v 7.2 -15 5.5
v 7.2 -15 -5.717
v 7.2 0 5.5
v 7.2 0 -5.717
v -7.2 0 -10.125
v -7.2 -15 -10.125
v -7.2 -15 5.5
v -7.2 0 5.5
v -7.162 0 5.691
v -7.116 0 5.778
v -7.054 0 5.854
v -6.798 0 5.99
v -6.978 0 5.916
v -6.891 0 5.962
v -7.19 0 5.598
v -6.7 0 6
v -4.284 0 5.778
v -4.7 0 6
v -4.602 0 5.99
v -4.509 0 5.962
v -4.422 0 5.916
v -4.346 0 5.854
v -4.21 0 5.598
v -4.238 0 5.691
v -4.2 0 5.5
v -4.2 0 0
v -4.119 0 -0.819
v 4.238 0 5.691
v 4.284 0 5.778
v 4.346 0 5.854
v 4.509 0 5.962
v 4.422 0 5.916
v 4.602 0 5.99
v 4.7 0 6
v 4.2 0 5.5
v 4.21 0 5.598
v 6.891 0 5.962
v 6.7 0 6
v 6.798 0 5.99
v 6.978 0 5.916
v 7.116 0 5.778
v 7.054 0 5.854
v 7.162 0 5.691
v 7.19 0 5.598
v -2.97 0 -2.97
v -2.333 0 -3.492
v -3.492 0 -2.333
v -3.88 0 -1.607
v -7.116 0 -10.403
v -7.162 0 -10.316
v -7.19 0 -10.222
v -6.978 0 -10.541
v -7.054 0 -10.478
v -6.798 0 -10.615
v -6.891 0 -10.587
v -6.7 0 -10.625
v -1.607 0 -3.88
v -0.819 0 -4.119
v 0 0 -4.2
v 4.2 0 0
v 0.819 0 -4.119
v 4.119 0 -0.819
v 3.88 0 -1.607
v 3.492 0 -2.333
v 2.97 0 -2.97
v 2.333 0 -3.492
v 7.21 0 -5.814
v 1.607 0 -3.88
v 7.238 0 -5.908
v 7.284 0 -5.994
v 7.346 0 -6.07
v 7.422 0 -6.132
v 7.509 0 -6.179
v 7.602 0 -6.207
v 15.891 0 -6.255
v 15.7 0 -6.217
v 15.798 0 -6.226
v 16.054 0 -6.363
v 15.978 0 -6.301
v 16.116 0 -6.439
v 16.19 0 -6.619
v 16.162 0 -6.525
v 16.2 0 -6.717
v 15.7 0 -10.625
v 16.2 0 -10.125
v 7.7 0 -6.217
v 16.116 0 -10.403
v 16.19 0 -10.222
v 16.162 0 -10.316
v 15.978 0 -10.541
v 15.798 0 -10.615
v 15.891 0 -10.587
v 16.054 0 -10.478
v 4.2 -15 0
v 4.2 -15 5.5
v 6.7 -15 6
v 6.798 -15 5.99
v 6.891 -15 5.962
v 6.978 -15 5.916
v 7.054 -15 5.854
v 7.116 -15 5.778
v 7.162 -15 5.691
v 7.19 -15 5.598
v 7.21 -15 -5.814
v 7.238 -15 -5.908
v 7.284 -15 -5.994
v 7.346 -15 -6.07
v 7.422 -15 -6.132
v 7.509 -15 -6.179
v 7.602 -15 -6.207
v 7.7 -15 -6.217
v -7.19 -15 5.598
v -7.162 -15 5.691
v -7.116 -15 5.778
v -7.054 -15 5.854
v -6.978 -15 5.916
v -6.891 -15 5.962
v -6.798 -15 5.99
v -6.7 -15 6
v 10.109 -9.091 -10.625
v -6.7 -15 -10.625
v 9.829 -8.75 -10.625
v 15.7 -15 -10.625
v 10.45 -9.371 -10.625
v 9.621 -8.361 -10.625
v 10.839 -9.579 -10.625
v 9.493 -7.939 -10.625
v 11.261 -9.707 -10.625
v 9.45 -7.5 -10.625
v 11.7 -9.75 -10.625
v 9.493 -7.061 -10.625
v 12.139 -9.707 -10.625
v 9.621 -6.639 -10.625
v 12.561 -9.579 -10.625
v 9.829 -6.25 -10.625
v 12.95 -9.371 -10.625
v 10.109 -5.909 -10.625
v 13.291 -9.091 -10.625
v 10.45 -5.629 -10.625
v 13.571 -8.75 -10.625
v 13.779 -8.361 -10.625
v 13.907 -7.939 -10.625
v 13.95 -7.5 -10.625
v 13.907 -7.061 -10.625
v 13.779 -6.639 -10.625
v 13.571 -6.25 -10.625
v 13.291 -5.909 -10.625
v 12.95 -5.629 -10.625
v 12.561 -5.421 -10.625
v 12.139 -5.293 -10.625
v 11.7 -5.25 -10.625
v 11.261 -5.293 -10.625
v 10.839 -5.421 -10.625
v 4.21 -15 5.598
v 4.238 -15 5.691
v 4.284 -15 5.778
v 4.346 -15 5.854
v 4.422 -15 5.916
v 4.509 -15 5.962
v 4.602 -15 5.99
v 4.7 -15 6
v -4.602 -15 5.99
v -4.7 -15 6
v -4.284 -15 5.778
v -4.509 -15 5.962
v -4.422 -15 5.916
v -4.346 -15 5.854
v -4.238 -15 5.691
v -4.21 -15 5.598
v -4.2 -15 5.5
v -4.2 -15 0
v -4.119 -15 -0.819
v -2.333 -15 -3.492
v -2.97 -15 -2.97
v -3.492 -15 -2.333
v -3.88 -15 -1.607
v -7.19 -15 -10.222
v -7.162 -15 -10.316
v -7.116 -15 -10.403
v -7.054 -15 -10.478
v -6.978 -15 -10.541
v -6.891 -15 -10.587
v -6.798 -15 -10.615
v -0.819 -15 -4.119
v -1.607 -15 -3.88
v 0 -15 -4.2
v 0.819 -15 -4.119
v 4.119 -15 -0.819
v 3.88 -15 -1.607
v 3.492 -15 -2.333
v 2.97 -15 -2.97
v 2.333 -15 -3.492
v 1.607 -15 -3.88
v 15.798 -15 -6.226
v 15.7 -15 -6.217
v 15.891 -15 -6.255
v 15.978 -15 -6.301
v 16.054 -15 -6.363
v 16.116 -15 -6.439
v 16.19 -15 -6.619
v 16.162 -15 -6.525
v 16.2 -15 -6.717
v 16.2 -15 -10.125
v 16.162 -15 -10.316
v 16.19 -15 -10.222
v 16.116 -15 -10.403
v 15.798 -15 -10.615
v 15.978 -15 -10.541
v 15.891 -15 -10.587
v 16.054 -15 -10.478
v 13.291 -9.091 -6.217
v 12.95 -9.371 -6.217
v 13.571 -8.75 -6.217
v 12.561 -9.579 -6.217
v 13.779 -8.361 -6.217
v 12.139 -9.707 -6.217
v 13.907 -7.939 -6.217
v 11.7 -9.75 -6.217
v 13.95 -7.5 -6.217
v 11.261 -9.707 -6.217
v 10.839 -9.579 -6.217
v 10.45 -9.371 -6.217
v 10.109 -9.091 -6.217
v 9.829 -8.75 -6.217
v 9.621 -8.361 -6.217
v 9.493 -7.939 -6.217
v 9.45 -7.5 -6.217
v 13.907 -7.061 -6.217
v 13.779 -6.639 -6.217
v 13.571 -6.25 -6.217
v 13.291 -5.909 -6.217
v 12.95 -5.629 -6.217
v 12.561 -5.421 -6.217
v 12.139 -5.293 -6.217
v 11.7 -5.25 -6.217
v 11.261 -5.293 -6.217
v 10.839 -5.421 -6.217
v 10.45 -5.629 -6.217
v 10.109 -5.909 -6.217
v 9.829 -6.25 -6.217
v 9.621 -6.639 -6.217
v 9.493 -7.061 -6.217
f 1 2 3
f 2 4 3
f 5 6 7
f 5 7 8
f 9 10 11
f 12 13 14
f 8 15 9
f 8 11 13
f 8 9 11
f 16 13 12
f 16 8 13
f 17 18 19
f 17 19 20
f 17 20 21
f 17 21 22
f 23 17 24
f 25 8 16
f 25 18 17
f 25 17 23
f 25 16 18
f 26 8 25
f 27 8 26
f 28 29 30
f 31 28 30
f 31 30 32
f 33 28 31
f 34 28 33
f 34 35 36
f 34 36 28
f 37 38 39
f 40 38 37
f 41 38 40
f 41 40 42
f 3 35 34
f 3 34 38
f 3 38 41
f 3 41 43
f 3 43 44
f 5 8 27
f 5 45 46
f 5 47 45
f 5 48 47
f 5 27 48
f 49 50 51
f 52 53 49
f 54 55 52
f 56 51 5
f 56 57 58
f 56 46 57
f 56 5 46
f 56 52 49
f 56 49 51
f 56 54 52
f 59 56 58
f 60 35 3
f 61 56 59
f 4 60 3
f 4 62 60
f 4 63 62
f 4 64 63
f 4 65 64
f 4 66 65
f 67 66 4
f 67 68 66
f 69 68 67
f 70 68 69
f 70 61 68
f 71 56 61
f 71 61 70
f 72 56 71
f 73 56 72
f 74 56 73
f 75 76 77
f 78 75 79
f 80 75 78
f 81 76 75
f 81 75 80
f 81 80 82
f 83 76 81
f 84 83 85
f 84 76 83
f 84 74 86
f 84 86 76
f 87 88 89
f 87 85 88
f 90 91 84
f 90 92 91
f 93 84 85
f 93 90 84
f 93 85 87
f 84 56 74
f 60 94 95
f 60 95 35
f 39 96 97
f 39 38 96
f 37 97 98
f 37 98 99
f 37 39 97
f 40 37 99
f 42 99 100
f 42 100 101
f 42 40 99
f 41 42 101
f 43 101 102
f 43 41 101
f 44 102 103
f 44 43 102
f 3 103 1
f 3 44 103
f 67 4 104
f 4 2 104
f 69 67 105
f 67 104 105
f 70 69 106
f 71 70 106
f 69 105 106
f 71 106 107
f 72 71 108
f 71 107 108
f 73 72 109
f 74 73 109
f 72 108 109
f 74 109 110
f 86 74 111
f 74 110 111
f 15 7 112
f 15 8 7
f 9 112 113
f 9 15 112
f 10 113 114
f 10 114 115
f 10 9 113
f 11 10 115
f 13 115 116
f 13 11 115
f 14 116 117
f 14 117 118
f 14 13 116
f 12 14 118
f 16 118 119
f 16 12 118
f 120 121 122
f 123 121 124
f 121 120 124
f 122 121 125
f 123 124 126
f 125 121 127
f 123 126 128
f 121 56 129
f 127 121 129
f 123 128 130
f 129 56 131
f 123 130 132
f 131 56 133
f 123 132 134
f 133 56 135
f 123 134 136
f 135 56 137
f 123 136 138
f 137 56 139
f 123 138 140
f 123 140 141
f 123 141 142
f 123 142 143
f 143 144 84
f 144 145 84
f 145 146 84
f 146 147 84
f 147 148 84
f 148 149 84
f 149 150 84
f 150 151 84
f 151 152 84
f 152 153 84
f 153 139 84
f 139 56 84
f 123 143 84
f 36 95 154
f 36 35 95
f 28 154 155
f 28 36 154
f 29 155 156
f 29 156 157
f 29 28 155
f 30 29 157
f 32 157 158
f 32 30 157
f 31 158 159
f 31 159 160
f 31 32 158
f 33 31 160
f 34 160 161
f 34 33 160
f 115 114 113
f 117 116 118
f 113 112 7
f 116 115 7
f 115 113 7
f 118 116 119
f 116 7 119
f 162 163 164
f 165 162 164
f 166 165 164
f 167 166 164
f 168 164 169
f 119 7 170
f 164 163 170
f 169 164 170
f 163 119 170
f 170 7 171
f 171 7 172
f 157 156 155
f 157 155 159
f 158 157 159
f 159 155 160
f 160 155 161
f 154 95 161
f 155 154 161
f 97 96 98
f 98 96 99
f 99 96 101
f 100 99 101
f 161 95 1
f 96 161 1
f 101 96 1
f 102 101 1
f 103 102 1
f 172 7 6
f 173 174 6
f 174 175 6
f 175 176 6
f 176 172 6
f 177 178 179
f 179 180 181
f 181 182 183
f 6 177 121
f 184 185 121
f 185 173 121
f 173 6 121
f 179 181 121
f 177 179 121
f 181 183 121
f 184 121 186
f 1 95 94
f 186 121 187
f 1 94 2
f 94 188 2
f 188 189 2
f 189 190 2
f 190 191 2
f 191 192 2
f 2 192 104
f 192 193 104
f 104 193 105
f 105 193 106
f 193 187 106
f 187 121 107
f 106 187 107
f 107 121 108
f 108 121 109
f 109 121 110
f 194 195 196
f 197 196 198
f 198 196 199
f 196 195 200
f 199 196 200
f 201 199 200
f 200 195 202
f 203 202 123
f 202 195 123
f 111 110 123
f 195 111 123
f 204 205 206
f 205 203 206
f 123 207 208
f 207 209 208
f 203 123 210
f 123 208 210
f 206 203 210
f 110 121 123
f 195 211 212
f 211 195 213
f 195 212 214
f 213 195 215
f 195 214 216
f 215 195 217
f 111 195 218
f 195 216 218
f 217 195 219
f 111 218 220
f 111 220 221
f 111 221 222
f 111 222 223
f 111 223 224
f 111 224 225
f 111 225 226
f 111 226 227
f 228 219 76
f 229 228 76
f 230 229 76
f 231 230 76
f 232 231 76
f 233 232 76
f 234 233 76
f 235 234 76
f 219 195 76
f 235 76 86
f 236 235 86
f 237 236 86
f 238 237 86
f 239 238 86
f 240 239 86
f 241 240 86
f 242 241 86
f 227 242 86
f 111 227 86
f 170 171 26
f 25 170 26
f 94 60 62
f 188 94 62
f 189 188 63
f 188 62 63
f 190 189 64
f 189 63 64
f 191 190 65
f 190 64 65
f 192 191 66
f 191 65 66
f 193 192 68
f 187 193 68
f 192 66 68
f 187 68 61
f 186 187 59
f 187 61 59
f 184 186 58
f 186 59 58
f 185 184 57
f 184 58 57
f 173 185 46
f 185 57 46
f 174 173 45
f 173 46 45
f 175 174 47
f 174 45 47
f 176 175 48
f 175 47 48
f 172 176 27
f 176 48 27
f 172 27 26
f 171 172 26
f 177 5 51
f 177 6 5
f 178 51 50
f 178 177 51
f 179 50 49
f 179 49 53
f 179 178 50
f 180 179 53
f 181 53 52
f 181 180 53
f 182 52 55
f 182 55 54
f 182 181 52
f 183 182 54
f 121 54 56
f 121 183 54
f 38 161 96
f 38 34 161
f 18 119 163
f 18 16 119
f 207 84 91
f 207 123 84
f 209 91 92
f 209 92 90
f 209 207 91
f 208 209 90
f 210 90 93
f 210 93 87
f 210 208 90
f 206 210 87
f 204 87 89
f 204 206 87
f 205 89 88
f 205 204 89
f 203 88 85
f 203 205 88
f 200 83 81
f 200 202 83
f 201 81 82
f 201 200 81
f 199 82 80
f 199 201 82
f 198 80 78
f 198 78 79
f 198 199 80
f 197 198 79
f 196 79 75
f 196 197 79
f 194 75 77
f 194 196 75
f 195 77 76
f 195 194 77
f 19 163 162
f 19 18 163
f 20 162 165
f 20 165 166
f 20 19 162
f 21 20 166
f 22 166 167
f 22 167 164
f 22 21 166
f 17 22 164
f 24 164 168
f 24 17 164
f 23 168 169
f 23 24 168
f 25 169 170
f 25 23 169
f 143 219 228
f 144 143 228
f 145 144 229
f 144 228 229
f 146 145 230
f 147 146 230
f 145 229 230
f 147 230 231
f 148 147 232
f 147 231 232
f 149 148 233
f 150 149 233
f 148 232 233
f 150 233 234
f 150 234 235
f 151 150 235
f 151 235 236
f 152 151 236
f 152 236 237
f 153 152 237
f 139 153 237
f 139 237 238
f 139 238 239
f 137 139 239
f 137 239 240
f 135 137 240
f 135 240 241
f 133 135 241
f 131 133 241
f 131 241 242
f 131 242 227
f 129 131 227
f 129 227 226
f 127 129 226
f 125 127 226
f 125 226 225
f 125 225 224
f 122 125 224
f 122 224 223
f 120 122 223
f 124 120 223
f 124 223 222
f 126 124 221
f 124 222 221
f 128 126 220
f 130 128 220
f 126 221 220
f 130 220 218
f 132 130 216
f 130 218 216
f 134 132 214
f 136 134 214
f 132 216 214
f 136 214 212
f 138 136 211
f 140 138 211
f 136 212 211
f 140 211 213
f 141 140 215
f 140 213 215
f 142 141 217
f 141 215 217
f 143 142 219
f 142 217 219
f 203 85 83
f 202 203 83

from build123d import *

# Parameters (mm, degrees)
F1_DEPTH = 15
F2_W     = 3
F2_H     = 15
F3_DEPTH = 6
F4_R     = 2.25
F5_DEPTH = 25
F6_R     = 0.5
F7_R     = 0.5


with BuildPart() as f1:
    # F0 (on Front) → F1 (new body)
    with BuildSketch(Plane.XZ):
        with BuildLine():
            ThreePointArc((4.2, 0), (0, -4.2), (-4.2, 0))
            Line((-4.2, 0), (-7.2, 0))
            Line((-7.2, 0), (-7.2, -10.624883))
            Line((-7.2, -10.624883), (16.2, -10.624883))
            Line((16.2, -10.624883), (16.2, -6.216642))
            Line((16.2, -6.216642), (7.2, -6.216642))
            Line((7.2, -6.216642), (7.2, 0))
            Line((7.2, 0), (4.2, 0))
        make_face()
    extrude(amount=F1_DEPTH)

    # F2 (on face) → F3 (join)
    with BuildSketch(Plane.XY):
        with Locations((-5.7, -7.5)):
            Rectangle(F2_W, F2_H)
        with Locations((5.7, -7.5)):
            Rectangle(F2_W, F2_H)
    extrude(amount=F3_DEPTH)

    # F4 (on face) → F5 (cut)
    with BuildSketch(Plane.XY.offset(-6.216642)):
        with Locations((11.7, -7.5)):
            Circle(F4_R)
    extrude(amount=-F5_DEPTH, mode=Mode.SUBTRACT)

    # F6
    f6_edges = [f1.edges().sort_by_distance(p)[0] for p in [
        (-7.2, -7.5, -10.624883),
        (16.2, -7.5, -10.624883),
        (-7.2, -7.5, 6),
        (-4.2, -7.5, 6),
        (4.2, -7.5, 6),
        (7.2, -7.5, 6),
        (7.2, -7.5, -6.216642),
    ]]
    fillet(f6_edges, radius=F6_R)

    # F7
    f7_edges = [f1.edges().sort_by_distance(p)[0] for p in [
        (16.2, -7.5, -6.216642),
    ]]
    fillet(f7_edges, radius=F7_R)


solid = f1.part
